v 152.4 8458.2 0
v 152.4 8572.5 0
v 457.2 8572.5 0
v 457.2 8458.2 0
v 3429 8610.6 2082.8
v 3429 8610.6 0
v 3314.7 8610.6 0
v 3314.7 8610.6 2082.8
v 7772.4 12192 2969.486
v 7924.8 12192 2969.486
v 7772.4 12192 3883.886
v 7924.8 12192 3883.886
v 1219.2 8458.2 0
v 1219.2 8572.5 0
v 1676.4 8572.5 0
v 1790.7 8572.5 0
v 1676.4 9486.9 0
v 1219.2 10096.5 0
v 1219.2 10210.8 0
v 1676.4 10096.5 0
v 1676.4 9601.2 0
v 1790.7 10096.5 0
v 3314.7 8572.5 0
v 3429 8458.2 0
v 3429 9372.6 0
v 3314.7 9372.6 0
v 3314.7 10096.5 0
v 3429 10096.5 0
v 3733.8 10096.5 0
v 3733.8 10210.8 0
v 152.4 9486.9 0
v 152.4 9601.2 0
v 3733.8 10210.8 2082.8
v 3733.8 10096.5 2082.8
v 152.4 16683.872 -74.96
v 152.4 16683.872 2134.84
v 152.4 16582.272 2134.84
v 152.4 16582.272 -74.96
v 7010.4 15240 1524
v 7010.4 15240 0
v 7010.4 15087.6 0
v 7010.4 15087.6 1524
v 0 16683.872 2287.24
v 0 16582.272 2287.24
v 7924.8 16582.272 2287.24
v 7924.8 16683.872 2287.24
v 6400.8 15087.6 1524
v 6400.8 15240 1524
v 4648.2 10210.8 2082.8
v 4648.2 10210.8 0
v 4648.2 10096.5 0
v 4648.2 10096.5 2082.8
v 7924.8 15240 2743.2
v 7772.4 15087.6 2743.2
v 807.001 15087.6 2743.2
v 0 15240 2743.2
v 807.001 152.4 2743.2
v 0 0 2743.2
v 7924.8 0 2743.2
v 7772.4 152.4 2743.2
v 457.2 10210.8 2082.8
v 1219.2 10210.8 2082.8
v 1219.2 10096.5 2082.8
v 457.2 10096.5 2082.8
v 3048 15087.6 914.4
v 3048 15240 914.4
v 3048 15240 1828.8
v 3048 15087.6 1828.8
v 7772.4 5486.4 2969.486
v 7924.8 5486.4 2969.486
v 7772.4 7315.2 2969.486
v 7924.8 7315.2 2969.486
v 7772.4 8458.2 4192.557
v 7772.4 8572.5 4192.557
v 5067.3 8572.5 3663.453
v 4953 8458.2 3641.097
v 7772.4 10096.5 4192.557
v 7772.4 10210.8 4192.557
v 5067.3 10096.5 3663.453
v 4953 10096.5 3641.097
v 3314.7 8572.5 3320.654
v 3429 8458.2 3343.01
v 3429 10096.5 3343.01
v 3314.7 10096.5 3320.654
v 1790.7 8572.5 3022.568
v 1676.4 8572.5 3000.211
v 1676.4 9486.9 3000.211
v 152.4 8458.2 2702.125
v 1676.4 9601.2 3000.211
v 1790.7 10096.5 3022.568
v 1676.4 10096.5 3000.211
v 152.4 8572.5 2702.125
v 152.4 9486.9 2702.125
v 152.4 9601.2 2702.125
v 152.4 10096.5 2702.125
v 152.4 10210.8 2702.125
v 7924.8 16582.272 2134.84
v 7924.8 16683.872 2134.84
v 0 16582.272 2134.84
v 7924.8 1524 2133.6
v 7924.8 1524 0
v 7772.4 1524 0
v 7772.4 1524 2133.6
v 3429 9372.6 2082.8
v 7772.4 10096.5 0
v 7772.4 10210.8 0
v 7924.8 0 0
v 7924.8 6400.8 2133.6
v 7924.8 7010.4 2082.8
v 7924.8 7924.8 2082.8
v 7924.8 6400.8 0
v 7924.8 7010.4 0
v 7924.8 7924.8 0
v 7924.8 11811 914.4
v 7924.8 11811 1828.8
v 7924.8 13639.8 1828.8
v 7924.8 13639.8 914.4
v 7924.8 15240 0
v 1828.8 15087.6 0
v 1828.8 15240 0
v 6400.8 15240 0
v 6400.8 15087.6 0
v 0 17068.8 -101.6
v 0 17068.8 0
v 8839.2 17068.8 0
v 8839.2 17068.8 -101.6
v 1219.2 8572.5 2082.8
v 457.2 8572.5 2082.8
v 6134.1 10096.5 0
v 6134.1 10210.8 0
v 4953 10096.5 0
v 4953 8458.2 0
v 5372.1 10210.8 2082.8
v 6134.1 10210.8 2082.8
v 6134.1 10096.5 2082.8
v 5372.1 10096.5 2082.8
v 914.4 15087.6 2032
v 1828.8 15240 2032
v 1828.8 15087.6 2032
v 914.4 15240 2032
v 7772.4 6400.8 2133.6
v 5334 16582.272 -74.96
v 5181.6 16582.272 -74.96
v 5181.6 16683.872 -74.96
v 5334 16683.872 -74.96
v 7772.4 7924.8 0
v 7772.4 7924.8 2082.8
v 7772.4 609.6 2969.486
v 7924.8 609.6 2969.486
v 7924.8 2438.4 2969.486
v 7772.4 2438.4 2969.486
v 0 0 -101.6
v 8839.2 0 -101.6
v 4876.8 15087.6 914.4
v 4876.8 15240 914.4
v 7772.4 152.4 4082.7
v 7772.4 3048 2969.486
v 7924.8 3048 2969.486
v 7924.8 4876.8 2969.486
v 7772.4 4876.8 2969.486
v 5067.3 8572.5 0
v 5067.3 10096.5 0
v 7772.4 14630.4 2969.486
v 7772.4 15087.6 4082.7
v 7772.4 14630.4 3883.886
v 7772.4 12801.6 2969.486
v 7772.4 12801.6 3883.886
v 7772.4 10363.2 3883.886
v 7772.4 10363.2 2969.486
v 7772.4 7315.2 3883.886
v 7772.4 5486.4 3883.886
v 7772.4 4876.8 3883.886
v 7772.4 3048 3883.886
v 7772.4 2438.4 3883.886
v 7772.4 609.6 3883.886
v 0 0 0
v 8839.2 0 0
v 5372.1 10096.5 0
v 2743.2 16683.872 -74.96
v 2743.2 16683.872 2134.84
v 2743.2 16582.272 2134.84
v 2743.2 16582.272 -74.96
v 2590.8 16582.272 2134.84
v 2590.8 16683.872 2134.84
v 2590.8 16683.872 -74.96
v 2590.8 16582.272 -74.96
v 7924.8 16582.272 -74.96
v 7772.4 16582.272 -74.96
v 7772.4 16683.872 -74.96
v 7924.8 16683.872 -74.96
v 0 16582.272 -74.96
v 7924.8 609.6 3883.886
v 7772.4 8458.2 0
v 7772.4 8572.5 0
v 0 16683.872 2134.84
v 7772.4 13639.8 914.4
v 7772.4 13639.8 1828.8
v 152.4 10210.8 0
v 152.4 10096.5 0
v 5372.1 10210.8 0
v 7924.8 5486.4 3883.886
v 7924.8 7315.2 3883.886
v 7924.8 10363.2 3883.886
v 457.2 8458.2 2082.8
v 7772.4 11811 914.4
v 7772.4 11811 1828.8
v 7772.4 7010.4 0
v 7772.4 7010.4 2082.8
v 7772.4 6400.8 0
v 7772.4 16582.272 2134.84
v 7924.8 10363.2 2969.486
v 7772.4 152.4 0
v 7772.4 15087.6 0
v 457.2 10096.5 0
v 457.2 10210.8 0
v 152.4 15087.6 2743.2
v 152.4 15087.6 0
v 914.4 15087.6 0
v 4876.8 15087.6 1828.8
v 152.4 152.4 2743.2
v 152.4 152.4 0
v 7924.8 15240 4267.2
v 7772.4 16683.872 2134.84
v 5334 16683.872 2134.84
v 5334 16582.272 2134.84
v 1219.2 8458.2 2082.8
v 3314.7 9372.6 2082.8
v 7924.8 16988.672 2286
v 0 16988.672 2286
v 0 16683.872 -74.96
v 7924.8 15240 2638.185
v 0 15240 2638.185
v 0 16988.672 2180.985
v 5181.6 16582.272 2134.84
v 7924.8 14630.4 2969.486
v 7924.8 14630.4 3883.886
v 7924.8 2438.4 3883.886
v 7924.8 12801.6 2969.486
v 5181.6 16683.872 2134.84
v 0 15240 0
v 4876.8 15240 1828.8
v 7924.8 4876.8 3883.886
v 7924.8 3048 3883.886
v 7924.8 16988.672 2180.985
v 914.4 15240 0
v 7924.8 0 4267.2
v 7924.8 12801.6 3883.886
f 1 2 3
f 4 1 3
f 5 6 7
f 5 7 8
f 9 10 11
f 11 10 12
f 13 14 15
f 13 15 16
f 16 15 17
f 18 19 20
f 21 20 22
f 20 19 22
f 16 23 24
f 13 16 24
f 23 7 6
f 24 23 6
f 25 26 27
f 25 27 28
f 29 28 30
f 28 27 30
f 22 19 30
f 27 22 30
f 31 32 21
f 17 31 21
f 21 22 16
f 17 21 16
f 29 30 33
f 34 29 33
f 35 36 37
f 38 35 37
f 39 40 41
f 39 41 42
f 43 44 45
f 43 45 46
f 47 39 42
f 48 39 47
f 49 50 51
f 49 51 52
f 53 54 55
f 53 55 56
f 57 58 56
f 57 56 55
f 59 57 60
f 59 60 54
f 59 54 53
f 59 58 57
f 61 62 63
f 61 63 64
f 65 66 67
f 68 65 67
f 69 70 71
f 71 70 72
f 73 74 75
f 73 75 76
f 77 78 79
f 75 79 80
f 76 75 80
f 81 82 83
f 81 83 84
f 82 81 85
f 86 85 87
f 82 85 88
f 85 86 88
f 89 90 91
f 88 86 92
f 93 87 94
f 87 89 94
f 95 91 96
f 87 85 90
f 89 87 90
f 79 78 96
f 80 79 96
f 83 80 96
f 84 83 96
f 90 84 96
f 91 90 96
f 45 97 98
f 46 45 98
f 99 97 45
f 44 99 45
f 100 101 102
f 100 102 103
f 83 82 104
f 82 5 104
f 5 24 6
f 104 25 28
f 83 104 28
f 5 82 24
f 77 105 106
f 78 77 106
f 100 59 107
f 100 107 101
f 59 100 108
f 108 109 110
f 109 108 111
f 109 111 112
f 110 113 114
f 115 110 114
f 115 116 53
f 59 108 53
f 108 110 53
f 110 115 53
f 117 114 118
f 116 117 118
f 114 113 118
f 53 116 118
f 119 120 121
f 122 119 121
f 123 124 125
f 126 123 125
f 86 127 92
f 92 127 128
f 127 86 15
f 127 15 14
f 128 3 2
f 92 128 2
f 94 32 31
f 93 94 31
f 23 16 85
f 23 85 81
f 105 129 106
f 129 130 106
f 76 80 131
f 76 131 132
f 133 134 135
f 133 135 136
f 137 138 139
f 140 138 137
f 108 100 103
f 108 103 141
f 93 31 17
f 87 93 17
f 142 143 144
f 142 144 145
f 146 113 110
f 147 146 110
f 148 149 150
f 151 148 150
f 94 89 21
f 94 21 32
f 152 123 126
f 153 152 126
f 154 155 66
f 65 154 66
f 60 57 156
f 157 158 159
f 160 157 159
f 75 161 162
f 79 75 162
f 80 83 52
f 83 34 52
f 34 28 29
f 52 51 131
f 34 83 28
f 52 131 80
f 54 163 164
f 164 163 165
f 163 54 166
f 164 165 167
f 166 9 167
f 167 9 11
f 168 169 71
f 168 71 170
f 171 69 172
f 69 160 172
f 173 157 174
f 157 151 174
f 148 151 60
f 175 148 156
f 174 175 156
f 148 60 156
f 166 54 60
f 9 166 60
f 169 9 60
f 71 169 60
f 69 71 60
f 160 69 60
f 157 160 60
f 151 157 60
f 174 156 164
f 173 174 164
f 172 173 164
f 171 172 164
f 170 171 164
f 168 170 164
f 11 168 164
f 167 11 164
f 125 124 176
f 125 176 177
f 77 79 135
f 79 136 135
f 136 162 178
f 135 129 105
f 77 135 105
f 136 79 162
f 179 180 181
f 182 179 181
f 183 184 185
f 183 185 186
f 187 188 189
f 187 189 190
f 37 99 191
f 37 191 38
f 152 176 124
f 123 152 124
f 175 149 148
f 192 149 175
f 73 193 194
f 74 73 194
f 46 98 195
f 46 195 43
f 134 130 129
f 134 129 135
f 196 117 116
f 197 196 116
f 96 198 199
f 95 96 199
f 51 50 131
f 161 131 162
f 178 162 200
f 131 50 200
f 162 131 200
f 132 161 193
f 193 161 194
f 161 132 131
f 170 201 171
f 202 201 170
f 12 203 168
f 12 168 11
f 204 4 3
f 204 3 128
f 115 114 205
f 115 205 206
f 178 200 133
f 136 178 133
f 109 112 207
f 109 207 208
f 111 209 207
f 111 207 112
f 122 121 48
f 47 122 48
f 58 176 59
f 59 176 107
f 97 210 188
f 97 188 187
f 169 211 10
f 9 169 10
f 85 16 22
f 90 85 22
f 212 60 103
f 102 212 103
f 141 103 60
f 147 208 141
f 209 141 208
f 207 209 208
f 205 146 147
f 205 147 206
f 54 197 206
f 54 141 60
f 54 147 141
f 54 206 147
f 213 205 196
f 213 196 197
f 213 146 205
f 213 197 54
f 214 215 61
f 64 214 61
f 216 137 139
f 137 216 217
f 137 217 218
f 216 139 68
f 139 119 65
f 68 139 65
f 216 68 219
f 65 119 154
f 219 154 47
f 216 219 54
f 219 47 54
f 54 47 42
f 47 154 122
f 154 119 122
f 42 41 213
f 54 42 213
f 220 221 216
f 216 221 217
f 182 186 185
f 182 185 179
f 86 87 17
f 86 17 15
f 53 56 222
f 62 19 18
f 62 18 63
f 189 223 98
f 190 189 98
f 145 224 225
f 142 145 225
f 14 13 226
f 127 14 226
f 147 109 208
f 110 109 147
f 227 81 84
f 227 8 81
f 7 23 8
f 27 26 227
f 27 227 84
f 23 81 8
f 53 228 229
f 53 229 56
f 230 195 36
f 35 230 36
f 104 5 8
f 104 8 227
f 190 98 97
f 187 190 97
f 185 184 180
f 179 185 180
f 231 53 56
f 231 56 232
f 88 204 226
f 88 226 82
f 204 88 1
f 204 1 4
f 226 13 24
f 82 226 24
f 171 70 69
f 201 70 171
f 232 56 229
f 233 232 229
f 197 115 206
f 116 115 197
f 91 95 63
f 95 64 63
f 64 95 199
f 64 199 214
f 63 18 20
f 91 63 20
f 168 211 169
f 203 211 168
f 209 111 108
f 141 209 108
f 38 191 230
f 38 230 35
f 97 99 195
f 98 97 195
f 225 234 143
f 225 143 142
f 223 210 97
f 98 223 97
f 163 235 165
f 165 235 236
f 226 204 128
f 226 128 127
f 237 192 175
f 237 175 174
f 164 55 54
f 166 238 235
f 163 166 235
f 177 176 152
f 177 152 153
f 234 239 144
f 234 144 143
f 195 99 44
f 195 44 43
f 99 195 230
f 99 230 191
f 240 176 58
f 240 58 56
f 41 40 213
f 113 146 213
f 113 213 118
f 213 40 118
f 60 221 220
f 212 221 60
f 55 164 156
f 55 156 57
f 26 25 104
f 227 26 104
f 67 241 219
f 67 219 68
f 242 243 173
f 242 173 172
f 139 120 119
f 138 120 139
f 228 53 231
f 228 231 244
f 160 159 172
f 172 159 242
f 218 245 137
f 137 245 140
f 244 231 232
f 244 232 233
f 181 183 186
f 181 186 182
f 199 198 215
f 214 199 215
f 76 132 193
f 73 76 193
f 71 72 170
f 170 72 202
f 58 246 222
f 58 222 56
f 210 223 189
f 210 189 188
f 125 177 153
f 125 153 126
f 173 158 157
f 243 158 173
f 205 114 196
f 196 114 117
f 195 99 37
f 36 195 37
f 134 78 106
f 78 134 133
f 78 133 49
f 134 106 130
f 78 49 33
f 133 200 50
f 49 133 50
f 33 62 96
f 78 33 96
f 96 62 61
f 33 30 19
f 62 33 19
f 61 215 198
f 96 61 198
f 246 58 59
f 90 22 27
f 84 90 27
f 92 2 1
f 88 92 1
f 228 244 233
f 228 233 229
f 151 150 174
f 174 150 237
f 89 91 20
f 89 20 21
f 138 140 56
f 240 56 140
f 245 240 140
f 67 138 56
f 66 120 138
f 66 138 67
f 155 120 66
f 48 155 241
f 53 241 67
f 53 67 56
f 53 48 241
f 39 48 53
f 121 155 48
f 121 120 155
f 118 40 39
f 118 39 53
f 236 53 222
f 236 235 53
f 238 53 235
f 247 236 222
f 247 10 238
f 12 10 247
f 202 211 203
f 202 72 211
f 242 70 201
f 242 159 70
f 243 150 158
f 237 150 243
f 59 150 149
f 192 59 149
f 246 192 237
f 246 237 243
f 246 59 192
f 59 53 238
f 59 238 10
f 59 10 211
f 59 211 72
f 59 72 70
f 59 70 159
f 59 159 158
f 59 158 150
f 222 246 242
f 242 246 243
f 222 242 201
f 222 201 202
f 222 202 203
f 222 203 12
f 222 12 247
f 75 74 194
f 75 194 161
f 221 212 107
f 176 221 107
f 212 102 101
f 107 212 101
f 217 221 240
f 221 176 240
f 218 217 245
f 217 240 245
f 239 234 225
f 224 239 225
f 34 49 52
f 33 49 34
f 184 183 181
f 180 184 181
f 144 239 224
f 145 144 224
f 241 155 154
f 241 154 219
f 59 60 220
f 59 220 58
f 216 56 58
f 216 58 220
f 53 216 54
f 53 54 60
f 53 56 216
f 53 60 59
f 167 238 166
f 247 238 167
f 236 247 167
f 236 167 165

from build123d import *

# Parameters (mm, degrees)
F1_W      = 8839.2
F1_H      = 17068.8
F2_DEPTH  = 101.6
F0_W      = 7924.8
F0_H      = 15240
F0_W_2    = 7620
F0_H_2    = 14935.2
F3_DEPTH  = 2743.2
F5_DEPTH  = 15240
F6_W      = 4876.8
F6_H      = 2133.6
F7_DEPTH  = 304.8
F9_DEPTH  = 7924.8
F10_W     = 609.6
F10_H     = 1524
F10_W_2   = 1828.8
F10_H_2   = 914.4
F10_W_3   = 914.4
F10_H_3   = 2032
F11_DEPTH = 304.8
F12_T     = -152.4
F13_W     = 1828.8
F13_H     = 914.4
F14_DEPTH = 304.8
F15_W     = 101.6
F15_H     = 152.4
F16_DEPTH = 7924.8
F17_W     = 152.4
F17_H     = 101.6
F18_DEPTH = 2209.8
F19_W     = 1524
F19_H     = 1524
F20_DEPTH = 4267.2
F21_W     = 762
F21_H     = 2082.8
F22_DEPTH = 152.4
F23_W     = 762
F23_H     = 2082.8
F23_W_2   = 914.4
F24_DEPTH = 152.4
F25_W     = 1828.8
F25_H     = 914.4
F26_DEPTH = 152.4
F28_DEPTH = 1811.79238
F29_W     = 914.4
F29_H     = 2082.8
F30_DEPTH = 152.4
F31_W     = 762
F31_H     = 2082.8
F32_DEPTH = 152.4


# Not quite as in the source:
# - a feature names something its author has since deleted; it is built from what else it names


with BuildPart() as f2:
    # F1 (on Top) → F2 (new body)
    with BuildSketch(Plane.XY):
        with Locations((4419.6, 8534.4)):
            Rectangle(F1_W, F1_H)
    extrude(amount=-F2_DEPTH)


with BuildPart() as f3:
    # F0 (on Top) → F3 (new body)
    with BuildSketch(Plane.XY):
        with Locations((3962.4, 7620)):
            Rectangle(F0_W, F0_H)
        with Locations((3962.4, 7620)):
            Rectangle(F0_W_2, F0_H_2, mode=Mode.SUBTRACT)
    extrude(amount=F3_DEPTH)

    # F6 (on face) → F7 (cut)
    with BuildSketch(Plane.YZ.offset(7924.8)):
        with Locations((3962.4, 1066.8)):
            Rectangle(F6_W, F6_H)
    extrude(amount=-F7_DEPTH, mode=Mode.SUBTRACT)

    # F10 (on face) → F11 (cut)
    with BuildSketch(Plane(origin=(0, 15240, 0), x_dir=(-1, 0, 0), z_dir=(0, 1, 0))):
        with Locations((-6705.6, 762)):
            Rectangle(F10_W, F10_H)
        with Locations((-3962.4, 1371.6)):
            Rectangle(F10_W_2, F10_H_2)
        with Locations((-1371.6, 1016)):
            Rectangle(F10_W_3, F10_H_3)
    extrude(amount=-F11_DEPTH, mode=Mode.SUBTRACT)

    # F25 (on face) → F26 (cut)
    with BuildSketch(Plane.YZ.offset(7924.8)):
        with Locations((12725.4, 1371.6)):
            Rectangle(F25_W, F25_H)
    extrude(amount=-F26_DEPTH, mode=Mode.SUBTRACT)

    # F29 (on face) → F30 (cut)
    with BuildSketch(Plane.YZ.offset(7924.8)):
        with Locations((7467.6, 1041.4)):
            Rectangle(F29_W, F29_H)
    extrude(amount=-F30_DEPTH, mode=Mode.SUBTRACT)


with BuildPart() as f5:
    # F4 (on face) → F5 (new body)
    with BuildSketch(Plane.XZ):
        Polygon((7924.8, 4267.2), (0, 2743.2), (7924.8, 2743.2), align=None)
    extrude(amount=-F5_DEPTH)

    # F12
    f12_openings = [f5.faces().sort_by_distance(p)[0] for p in [
        (3962.4, 7620, 2743.2),
    ]]
    offset(amount=F12_T, openings=f12_openings)

    # F13 (on face) → F14 (cut)
    with BuildSketch(Plane.YZ.offset(7924.8)):
        with Locations((1524, 3426.6855716705)):
            Rectangle(F13_W, F13_H)
        with Locations((3962.4, 3426.6855716705)):
            Rectangle(F13_W, F13_H)
        with Locations((6400.8, 3426.6855716705)):
            Rectangle(F13_W, F13_H)
        with Locations((11277.6, 3426.6855716705)):
            Rectangle(F13_W, F13_H)
        with Locations((13716, 3426.6855716705)):
            Rectangle(F13_W, F13_H)
    extrude(amount=-F14_DEPTH, mode=Mode.SUBTRACT)


with BuildPart() as f9:
    # F8 (on face) → F9 (new body)
    with BuildSketch(Plane.YZ.offset(7924.8)):
        Polygon((16988.6724450765, 2286), (15240, 2743.2), (15240, 2638.1847650622), (16988.6724450765, 2180.9847650622), align=None)
    extrude(amount=-F9_DEPTH)


with BuildPart() as f16:
    # F15 (on face) → F16 (new body)
    with BuildSketch(Plane.YZ.offset(7924.8)):
        with Locations((16633.0724450765, 2211.0402736471)):
            Rectangle(F15_W, F15_H)
    extrude(amount=-F16_DEPTH)


with BuildPart() as f18:
    # F17 (on face) → F18 (new body)
    with BuildSketch(Plane(origin=(0, 0, 2134.8402736471), x_dir=(1, 0, 0), z_dir=(0, 0, -1))):
        with Locations((7848.6, -16633.0724450765)):
            Rectangle(F17_W, F17_H)
    extrude(amount=F18_DEPTH)


with BuildPart() as f18b:
    # F17 (on face) → F18, piece 2 (new body)
    with BuildSketch(Plane(origin=(0, 0, 2134.8402736471), x_dir=(1, 0, 0), z_dir=(0, 0, -1))):
        with Locations((5257.8, -16633.0724450765)):
            Rectangle(F17_W, F17_H)
    extrude(amount=F18_DEPTH)


with BuildPart() as f18c:
    # F17 (on face) → F18, piece 3 (new body)
    with BuildSketch(Plane(origin=(0, 0, 2134.8402736471), x_dir=(1, 0, 0), z_dir=(0, 0, -1))):
        with Locations((2667, -16633.0724450765)):
            Rectangle(F17_W, F17_H)
    extrude(amount=F18_DEPTH)


with BuildPart() as f18d:
    # F17 (on face) → F18, piece 4 (new body)
    with BuildSketch(Plane(origin=(0, 0, 2134.8402736471), x_dir=(1, 0, 0), z_dir=(0, 0, -1))):
        with Locations((76.2, -16633.0724450765)):
            Rectangle(F17_W, F17_H)
    extrude(amount=F18_DEPTH)


with BuildPart() as f20:
    # F19 (on Top) → F20 (new body)
    with BuildSketch(Plane.XY):
        Polygon((7772.4, 10210.8), (152.4, 10210.8), (152.4, 10096.5), (1676.4, 10096.5), (1676.4, 9601.2), (152.4, 9601.2), (152.4, 9486.9), (1676.4, 9486.9), (1676.4, 8572.5), (152.4, 8572.5), (152.4, 8458.2), (3429, 8458.2), (3429, 10096.5), (4953, 10096.5), (4953, 8458.2), (7772.4, 8458.2), (7772.4, 8572.5), (5067.3, 8572.5), (5067.3, 10096.5), (7772.4, 10096.5), align=None)
        with Locations((2552.7, 9334.5)):
            Rectangle(F19_W, F19_H, mode=Mode.SUBTRACT)
    extrude(amount=F20_DEPTH)

    # F21 (on face) → F22 (cut)
    with BuildSketch(Plane.XZ.offset(-8458.2)):
        with Locations((838.2, 1041.4)):
            Rectangle(F21_W, F21_H)
    extrude(amount=-F22_DEPTH, mode=Mode.SUBTRACT)

    # F23 (on face) → F24 (cut)
    with BuildSketch(Plane(origin=(0, 10210.8, 0), x_dir=(-1, 0, 0), z_dir=(0, 1, 0))):
        with Locations((-838.2, 1041.4)):
            Rectangle(F23_W, F23_H)
        with Locations((-4191, 1041.4)):
            Rectangle(F23_W_2, F23_H)
        with Locations((-5753.1, 1041.4)):
            Rectangle(F23_W, F23_H)
    extrude(amount=-F24_DEPTH, mode=Mode.SUBTRACT)

    # F27 (on face) → F28 (cut)
    with BuildSketch(Plane(origin=(0, 10210.8, 0), x_dir=(-1, 0, 0), z_dir=(0, 1, 0))):
        Polygon((-7772.4, 4267.2), (-7772.4, 4192.5565476095), (-152.4, 2702.1246839401), (-152.4, 4267.2), align=None)
    extrude(amount=-F28_DEPTH, mode=Mode.SUBTRACT)

    # F31 (on face) → F32 (cut)
    with BuildSketch(Plane.YZ.offset(3429)):
        with Locations((8991.6, 1041.4)):
            Rectangle(F31_W, F31_H)
    extrude(amount=-F32_DEPTH, mode=Mode.SUBTRACT)


solid = Compound([f2.part, f3.part, f5.part, f9.part, f16.part, f18.part, f18b.part, f18c.part, f18d.part, f20.part])
